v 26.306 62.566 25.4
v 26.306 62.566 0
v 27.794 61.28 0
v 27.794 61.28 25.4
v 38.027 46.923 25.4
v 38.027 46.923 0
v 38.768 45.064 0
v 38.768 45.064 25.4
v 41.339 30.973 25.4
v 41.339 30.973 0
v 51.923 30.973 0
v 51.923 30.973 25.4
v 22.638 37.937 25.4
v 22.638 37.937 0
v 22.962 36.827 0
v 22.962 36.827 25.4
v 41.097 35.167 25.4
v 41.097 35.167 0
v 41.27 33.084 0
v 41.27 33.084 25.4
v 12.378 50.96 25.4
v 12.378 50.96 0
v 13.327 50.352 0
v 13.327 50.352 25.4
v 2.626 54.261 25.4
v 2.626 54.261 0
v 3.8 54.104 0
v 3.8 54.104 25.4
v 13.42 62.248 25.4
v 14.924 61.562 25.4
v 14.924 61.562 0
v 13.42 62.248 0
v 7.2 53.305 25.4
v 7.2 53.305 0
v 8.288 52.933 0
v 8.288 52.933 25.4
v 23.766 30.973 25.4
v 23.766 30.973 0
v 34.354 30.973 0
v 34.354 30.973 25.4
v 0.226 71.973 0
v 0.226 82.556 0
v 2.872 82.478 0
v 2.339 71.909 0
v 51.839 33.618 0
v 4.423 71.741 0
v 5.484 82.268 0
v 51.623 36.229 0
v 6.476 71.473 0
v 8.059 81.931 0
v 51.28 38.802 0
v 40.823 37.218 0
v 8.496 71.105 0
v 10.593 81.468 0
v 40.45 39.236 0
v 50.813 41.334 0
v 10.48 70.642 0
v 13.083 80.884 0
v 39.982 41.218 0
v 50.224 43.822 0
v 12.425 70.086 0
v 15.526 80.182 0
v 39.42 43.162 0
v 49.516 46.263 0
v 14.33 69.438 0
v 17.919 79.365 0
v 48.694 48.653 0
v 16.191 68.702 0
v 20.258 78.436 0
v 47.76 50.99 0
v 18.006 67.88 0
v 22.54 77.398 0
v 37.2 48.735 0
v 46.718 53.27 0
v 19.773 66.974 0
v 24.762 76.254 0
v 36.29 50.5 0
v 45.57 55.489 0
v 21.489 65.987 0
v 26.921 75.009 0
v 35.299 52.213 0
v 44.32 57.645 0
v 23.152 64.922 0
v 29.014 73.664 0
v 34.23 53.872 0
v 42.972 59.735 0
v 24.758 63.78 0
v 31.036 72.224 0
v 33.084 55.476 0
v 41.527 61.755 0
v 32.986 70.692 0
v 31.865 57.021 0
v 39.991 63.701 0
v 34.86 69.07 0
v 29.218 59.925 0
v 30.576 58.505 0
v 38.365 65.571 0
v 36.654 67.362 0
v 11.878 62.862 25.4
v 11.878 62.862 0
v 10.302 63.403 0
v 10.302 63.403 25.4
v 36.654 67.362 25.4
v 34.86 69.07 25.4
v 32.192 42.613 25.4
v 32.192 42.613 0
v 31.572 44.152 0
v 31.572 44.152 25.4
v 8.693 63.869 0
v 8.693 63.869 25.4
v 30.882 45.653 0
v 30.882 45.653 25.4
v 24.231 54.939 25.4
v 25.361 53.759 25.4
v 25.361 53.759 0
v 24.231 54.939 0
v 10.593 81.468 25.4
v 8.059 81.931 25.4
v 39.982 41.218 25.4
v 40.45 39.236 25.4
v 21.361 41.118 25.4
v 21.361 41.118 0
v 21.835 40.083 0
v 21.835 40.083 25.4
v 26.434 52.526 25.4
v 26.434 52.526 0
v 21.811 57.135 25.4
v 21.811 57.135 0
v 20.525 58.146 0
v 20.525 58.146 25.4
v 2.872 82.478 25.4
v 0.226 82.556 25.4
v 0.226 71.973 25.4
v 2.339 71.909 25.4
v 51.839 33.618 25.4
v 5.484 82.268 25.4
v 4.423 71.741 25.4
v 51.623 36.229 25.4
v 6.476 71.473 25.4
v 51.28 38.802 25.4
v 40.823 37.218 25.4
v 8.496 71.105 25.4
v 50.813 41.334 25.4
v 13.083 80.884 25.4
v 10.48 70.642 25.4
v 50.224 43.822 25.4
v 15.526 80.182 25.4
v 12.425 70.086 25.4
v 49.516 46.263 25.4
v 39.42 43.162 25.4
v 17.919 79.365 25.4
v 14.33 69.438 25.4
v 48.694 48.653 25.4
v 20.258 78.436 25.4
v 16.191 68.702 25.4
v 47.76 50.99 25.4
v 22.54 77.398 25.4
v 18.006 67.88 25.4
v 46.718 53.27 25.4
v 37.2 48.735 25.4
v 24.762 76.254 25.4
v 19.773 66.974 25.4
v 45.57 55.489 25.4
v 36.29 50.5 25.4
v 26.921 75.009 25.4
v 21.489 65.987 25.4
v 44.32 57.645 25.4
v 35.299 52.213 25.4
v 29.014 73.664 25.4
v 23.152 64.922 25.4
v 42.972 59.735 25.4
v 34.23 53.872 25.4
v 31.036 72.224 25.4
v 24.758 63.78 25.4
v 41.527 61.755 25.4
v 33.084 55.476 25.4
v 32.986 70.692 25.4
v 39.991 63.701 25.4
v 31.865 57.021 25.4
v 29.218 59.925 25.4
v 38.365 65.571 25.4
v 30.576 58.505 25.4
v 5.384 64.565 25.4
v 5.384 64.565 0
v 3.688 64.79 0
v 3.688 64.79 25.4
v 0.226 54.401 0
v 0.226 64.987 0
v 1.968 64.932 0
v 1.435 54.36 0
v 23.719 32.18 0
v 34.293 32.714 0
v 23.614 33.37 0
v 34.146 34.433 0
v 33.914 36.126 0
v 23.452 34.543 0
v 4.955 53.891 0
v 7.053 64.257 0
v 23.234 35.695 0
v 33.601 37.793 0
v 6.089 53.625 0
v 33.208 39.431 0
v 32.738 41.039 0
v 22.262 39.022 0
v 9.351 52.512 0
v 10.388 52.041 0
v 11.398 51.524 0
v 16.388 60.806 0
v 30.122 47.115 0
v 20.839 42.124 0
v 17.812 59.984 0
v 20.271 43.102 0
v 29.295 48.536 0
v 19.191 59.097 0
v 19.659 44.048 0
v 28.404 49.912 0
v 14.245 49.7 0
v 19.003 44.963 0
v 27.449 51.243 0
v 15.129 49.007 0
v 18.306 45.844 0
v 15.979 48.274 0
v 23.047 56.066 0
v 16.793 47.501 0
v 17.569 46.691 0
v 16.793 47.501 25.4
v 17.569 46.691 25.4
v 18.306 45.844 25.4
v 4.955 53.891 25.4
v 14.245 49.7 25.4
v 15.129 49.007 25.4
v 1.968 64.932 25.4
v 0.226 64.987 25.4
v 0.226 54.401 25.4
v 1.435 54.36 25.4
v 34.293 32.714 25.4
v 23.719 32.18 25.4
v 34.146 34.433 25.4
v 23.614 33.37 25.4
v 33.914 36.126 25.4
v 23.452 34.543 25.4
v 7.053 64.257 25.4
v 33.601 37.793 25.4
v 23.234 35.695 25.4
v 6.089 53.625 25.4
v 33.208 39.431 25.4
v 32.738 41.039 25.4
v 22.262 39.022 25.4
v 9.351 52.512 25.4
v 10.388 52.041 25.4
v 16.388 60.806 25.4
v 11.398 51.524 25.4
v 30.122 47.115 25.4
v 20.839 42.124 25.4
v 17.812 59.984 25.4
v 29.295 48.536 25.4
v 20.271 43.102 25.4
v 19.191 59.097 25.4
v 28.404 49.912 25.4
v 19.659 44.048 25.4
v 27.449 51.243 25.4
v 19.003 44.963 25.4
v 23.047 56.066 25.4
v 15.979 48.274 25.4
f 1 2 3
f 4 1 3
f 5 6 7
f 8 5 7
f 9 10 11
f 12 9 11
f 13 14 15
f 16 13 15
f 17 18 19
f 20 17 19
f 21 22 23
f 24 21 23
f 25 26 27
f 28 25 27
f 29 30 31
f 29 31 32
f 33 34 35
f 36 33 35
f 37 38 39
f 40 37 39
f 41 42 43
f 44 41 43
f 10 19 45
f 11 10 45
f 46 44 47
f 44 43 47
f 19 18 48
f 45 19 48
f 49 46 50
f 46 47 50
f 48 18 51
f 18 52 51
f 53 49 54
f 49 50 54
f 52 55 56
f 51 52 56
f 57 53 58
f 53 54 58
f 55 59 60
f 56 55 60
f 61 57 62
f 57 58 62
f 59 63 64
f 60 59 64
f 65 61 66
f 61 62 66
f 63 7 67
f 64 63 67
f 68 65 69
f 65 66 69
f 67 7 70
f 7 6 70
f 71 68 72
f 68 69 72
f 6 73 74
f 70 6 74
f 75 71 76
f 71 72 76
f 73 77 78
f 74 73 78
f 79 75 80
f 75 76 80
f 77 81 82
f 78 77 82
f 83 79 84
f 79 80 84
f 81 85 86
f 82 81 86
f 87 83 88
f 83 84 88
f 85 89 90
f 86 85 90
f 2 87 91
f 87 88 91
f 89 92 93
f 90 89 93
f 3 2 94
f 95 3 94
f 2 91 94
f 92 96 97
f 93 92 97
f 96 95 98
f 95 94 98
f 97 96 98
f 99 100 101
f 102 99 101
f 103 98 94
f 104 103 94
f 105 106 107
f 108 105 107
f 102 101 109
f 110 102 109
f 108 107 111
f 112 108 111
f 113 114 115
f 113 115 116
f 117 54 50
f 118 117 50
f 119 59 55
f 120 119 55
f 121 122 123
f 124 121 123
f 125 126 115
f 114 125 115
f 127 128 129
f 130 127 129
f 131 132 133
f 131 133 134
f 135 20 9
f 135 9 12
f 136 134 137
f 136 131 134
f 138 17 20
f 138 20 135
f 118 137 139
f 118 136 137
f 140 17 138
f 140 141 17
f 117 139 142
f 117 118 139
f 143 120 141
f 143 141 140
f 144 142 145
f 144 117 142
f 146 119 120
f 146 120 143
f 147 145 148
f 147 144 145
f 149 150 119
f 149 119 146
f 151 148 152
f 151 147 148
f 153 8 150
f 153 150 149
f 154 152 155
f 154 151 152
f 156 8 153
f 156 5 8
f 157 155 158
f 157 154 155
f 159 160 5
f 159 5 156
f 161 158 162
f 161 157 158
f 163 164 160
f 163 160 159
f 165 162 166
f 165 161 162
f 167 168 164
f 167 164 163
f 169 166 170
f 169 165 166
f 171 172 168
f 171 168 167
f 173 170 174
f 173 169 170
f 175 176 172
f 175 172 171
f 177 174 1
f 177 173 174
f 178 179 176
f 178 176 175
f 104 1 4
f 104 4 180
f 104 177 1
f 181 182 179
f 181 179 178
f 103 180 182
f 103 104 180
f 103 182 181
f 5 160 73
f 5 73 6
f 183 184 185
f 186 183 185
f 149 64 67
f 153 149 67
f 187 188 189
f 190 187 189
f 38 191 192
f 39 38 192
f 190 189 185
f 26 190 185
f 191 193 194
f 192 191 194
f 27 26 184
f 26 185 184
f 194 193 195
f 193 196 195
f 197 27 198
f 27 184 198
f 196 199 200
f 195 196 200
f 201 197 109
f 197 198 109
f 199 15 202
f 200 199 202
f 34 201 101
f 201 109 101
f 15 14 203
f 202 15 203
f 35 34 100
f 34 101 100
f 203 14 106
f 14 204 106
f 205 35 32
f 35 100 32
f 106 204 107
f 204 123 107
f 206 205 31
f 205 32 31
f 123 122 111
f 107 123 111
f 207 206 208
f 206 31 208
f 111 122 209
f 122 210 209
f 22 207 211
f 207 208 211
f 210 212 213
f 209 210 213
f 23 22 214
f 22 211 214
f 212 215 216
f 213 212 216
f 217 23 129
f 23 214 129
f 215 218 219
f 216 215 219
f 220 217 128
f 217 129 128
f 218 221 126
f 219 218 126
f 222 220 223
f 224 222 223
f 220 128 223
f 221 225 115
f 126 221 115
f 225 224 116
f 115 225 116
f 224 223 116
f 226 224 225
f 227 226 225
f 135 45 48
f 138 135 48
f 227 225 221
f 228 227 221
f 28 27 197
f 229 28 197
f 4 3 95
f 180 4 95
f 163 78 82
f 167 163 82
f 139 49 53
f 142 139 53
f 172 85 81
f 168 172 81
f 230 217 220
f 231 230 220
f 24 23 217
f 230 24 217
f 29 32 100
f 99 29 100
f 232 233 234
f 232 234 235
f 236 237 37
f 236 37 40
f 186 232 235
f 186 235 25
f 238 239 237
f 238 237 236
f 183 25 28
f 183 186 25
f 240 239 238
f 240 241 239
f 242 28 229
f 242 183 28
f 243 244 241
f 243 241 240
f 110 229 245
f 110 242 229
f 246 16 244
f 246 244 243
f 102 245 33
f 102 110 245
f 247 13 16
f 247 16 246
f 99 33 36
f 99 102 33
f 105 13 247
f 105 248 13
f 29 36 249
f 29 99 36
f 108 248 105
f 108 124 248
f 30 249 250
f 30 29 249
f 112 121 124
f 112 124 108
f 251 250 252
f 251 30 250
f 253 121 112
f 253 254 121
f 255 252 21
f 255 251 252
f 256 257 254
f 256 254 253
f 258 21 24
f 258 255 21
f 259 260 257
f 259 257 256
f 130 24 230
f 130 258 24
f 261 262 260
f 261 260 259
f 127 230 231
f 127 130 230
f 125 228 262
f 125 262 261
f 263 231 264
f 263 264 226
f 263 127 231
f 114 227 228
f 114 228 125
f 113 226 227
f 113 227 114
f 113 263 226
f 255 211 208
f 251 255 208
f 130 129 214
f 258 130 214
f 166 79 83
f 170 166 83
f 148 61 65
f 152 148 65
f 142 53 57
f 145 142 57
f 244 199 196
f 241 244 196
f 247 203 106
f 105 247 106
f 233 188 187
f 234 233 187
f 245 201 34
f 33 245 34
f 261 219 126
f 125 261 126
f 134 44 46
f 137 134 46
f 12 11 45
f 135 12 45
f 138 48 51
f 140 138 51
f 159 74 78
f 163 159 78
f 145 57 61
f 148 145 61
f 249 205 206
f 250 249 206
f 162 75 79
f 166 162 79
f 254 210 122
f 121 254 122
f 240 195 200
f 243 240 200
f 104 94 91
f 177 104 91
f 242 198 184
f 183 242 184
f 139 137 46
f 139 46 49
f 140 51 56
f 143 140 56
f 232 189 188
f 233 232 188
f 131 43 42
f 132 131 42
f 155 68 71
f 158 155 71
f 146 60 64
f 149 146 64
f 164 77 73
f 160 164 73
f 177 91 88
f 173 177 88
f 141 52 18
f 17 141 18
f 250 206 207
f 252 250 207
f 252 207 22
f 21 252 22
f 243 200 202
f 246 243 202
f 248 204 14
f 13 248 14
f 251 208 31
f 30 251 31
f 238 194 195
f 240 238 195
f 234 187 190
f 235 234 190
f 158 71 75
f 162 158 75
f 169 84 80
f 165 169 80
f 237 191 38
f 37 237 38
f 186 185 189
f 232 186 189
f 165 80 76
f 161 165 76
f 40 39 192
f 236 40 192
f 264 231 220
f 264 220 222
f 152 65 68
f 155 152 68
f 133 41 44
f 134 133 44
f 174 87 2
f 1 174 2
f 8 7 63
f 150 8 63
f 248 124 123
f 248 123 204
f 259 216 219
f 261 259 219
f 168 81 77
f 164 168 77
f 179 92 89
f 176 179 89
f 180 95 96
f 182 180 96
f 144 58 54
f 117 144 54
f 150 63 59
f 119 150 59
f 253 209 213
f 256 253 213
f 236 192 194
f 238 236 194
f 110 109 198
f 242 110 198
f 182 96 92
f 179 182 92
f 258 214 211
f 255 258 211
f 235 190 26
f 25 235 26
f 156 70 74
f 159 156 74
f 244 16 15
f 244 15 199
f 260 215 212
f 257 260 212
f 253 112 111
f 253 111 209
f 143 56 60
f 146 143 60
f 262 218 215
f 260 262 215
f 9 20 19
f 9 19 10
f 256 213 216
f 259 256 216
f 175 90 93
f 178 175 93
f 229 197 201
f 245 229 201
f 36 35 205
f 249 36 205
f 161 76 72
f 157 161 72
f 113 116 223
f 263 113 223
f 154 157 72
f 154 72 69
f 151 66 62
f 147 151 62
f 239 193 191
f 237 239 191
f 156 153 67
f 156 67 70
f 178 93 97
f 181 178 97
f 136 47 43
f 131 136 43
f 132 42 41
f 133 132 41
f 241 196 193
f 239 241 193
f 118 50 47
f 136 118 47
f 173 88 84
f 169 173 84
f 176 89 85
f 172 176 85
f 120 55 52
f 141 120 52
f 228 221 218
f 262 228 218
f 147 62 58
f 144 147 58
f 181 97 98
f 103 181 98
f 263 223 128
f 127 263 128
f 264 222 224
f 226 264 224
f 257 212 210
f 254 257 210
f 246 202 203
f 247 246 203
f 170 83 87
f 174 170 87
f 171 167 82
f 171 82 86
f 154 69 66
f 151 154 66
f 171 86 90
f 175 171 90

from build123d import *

# Parameters (mm, degrees)
F1_DEPTH = 25.4


with BuildPart() as f1:
    # F0 (on Top) → F1 (new body)
    with BuildSketch(Plane.XY):
        Polygon((1.968373, 64.932052), (0.226187, 64.987475), (0.226187, 64.656665), (0.226187, 64.325856), (0.226187, 63.995046), (0.226187, 63.664211), (0.226187, 63.333401), (0.226187, 63.002592), (0.226187, 62.671782), (0.226187, 62.340947), (0.226187, 62.010138), (0.226187, 61.679328), (0.226187, 61.348518), (0.226187, 61.017709), (0.226187, 60.686874), (0.226187, 60.356064), (0.226187, 60.025255), (0.226187, 59.694445), (0.226187, 59.36361), (0.226187, 59.0328), (0.226187, 58.701991), (0.226187, 58.371181), (0.226187, 58.040346), (0.226187, 57.709537), (0.226187, 57.378727), (0.226187, 57.047917), (0.226187, 56.717108), (0.226187, 56.386273), (0.226187, 56.055463), (0.226187, 55.724654), (0.226187, 55.393844), (0.226187, 55.063009), (0.226187, 54.732199), (0.226187, 54.40139), (1.434541, 54.360318), (2.626335, 54.260699), (3.800196, 54.10393), (4.954727, 53.891409), (6.088507, 53.624556), (7.200163, 53.304719), (8.288274, 52.933346), (9.351493, 52.511808), (10.388397, 52.041476), (11.397564, 51.523798), (12.377649, 50.960122), (13.327228, 50.351868), (14.244904, 49.700409), (15.129307, 49.007192), (15.979013, 48.273538), (16.792651, 47.500921), (17.568824, 46.690686), (18.30611, 45.844231), (19.003137, 44.962953), (19.658508, 44.048274), (20.270826, 43.101565), (20.838693, 42.124224), (21.360714, 41.117672), (21.835491, 40.083257), (22.261652, 39.022426), (22.637775, 37.936526), (22.962464, 36.826977), (23.234345, 35.695179), (23.452023, 34.542527), (23.614101, 33.370418), (23.719155, 32.180225), (23.765815, 30.97337), (24.096701, 30.97337), (24.427586, 30.97337), (24.758472, 30.97337), (25.089333, 30.97337), (25.420218, 30.97337), (25.751104, 30.97337), (26.08199, 30.97337), (26.41285, 30.97337), (26.743736, 30.97337), (27.074622, 30.97337), (27.405508, 30.97337), (27.736394, 30.97337), (28.067254, 30.97337), (28.39814, 30.97337), (28.729026, 30.97337), (29.059911, 30.97337), (29.390772, 30.97337), (29.721658, 30.97337), (30.052543, 30.97337), (30.383429, 30.97337), (30.71429, 30.97337), (31.045175, 30.97337), (31.376061, 30.97337), (31.706947, 30.97337), (32.037833, 30.97337), (32.368693, 30.97337), (32.699579, 30.97337), (33.030465, 30.97337), (33.361351, 30.97337), (33.692211, 30.97337), (34.023097, 30.97337), (34.353983, 30.97337), (34.29287, 32.714159), (34.145601, 34.432519), (33.914359, 36.126268), (33.601203, 37.793295), (33.208316, 39.431493), (32.737806, 41.038704), (32.191808, 42.612818), (31.572429, 44.151702), (30.881803, 45.653249), (30.122063, 47.115298), (29.295344, 48.535742), (28.403753, 49.912448), (27.449424, 51.243306), (26.434491, 52.526184), (25.361087, 53.758948), (24.231321, 54.939463), (23.047325, 56.065598), (21.811209, 57.135243), (20.52513, 58.14629), (19.191199, 59.09658), (17.811572, 59.98398), (16.388334, 60.806381), (14.923618, 61.561675), (13.419582, 62.247704), (11.87831, 62.862333), (10.301961, 63.40348), (8.692667, 63.86896), (7.052513, 64.256691), (5.383682, 64.564539), (3.688258, 64.790371), align=None)
        Polygon((2.87241, 82.477788), (0.226187, 82.556096), (0.226187, 82.225363), (0.226187, 81.894629), (0.226187, 81.563896), (0.226187, 81.233162), (0.226187, 80.902454), (0.226187, 80.571721), (0.226187, 80.240988), (0.226187, 79.910254), (0.226187, 79.579521), (0.226187, 79.248787), (0.226187, 78.918079), (0.226187, 78.587346), (0.226187, 78.256613), (0.226187, 77.925879), (0.226187, 77.595146), (0.226187, 77.264412), (0.226187, 76.933704), (0.226187, 76.602971), (0.226187, 76.272238), (0.226187, 75.941504), (0.226187, 75.610771), (0.226187, 75.280037), (0.226187, 74.949329), (0.226187, 74.618596), (0.226187, 74.287863), (0.226187, 73.957129), (0.226187, 73.626396), (0.226187, 73.295662), (0.226187, 72.964954), (0.226187, 72.634221), (0.226187, 72.303488), (0.226187, 71.972754), (2.338705, 71.908721), (4.422826, 71.741157), (6.476035, 71.472577), (8.495843, 71.105497), (10.479735, 70.642378), (12.425223, 70.085737), (14.329791, 69.438063), (16.190951, 68.701869), (18.006212, 67.879646), (19.773062, 66.973907), (21.48901, 65.987143), (23.151567, 64.921841), (24.758218, 63.780492), (26.30645, 62.565636), (27.793798, 61.279735), (29.217747, 59.925331), (30.575783, 58.504861), (31.865418, 57.020866), (33.084186, 55.475835), (34.229523, 53.872282), (35.29899, 52.212672), (36.290047, 50.499543), (37.20023, 48.735361), (38.027, 46.922639), (38.767893, 45.063893), (39.420394, 43.161585), (39.982013, 41.218231), (40.450237, 39.236371), (40.822575, 37.218417), (41.096514, 35.16696), (41.269564, 33.08444), (41.339262, 30.97337), (41.669995, 30.97337), (42.000703, 30.97337), (42.331437, 30.97337), (42.66217, 30.97337), (42.992904, 30.97337), (43.323637, 30.97337), (43.65437, 30.97337), (43.985078, 30.97337), (44.315812, 30.97337), (44.646545, 30.97337), (44.977279, 30.97337), (45.308012, 30.97337), (45.638745, 30.97337), (45.969453, 30.97337), (46.300187, 30.97337), (46.63092, 30.97337), (46.961654, 30.97337), (47.292387, 30.97337), (47.62312, 30.97337), (47.953828, 30.97337), (48.284562, 30.97337), (48.615295, 30.97337), (48.946029, 30.97337), (49.276762, 30.97337), (49.607495, 30.97337), (49.938203, 30.97337), (50.268937, 30.97337), (50.59967, 30.97337), (50.930404, 30.97337), (51.261137, 30.97337), (51.59187, 30.97337), (51.922578, 30.97337), (51.838581, 33.618195), (51.623443, 36.228706), (51.280441, 38.80165), (50.812776, 41.333801), (50.223674, 43.821934), (49.516411, 46.262823), (48.694162, 48.653217), (47.760204, 50.98989), (46.717737, 53.269642), (45.569988, 55.489221), (44.320231, 57.645376), (42.971644, 59.734907), (41.527476, 61.754563), (39.990979, 63.701117), (38.365379, 65.571345), (36.653876, 67.362019), (34.859722, 69.069915), (32.986167, 70.691756), (31.036387, 72.224367), (29.013683, 73.664496), (26.921231, 75.008892), (24.762282, 76.254356), (22.540062, 77.397635), (20.257821, 78.435505), (17.91876, 79.364738), (15.526106, 80.18211), (13.083134, 80.88437), (10.593045, 81.46829), (8.05909, 81.930672), (5.484444, 82.268238), align=None)
    extrude(amount=F1_DEPTH)


solid = f1.part
